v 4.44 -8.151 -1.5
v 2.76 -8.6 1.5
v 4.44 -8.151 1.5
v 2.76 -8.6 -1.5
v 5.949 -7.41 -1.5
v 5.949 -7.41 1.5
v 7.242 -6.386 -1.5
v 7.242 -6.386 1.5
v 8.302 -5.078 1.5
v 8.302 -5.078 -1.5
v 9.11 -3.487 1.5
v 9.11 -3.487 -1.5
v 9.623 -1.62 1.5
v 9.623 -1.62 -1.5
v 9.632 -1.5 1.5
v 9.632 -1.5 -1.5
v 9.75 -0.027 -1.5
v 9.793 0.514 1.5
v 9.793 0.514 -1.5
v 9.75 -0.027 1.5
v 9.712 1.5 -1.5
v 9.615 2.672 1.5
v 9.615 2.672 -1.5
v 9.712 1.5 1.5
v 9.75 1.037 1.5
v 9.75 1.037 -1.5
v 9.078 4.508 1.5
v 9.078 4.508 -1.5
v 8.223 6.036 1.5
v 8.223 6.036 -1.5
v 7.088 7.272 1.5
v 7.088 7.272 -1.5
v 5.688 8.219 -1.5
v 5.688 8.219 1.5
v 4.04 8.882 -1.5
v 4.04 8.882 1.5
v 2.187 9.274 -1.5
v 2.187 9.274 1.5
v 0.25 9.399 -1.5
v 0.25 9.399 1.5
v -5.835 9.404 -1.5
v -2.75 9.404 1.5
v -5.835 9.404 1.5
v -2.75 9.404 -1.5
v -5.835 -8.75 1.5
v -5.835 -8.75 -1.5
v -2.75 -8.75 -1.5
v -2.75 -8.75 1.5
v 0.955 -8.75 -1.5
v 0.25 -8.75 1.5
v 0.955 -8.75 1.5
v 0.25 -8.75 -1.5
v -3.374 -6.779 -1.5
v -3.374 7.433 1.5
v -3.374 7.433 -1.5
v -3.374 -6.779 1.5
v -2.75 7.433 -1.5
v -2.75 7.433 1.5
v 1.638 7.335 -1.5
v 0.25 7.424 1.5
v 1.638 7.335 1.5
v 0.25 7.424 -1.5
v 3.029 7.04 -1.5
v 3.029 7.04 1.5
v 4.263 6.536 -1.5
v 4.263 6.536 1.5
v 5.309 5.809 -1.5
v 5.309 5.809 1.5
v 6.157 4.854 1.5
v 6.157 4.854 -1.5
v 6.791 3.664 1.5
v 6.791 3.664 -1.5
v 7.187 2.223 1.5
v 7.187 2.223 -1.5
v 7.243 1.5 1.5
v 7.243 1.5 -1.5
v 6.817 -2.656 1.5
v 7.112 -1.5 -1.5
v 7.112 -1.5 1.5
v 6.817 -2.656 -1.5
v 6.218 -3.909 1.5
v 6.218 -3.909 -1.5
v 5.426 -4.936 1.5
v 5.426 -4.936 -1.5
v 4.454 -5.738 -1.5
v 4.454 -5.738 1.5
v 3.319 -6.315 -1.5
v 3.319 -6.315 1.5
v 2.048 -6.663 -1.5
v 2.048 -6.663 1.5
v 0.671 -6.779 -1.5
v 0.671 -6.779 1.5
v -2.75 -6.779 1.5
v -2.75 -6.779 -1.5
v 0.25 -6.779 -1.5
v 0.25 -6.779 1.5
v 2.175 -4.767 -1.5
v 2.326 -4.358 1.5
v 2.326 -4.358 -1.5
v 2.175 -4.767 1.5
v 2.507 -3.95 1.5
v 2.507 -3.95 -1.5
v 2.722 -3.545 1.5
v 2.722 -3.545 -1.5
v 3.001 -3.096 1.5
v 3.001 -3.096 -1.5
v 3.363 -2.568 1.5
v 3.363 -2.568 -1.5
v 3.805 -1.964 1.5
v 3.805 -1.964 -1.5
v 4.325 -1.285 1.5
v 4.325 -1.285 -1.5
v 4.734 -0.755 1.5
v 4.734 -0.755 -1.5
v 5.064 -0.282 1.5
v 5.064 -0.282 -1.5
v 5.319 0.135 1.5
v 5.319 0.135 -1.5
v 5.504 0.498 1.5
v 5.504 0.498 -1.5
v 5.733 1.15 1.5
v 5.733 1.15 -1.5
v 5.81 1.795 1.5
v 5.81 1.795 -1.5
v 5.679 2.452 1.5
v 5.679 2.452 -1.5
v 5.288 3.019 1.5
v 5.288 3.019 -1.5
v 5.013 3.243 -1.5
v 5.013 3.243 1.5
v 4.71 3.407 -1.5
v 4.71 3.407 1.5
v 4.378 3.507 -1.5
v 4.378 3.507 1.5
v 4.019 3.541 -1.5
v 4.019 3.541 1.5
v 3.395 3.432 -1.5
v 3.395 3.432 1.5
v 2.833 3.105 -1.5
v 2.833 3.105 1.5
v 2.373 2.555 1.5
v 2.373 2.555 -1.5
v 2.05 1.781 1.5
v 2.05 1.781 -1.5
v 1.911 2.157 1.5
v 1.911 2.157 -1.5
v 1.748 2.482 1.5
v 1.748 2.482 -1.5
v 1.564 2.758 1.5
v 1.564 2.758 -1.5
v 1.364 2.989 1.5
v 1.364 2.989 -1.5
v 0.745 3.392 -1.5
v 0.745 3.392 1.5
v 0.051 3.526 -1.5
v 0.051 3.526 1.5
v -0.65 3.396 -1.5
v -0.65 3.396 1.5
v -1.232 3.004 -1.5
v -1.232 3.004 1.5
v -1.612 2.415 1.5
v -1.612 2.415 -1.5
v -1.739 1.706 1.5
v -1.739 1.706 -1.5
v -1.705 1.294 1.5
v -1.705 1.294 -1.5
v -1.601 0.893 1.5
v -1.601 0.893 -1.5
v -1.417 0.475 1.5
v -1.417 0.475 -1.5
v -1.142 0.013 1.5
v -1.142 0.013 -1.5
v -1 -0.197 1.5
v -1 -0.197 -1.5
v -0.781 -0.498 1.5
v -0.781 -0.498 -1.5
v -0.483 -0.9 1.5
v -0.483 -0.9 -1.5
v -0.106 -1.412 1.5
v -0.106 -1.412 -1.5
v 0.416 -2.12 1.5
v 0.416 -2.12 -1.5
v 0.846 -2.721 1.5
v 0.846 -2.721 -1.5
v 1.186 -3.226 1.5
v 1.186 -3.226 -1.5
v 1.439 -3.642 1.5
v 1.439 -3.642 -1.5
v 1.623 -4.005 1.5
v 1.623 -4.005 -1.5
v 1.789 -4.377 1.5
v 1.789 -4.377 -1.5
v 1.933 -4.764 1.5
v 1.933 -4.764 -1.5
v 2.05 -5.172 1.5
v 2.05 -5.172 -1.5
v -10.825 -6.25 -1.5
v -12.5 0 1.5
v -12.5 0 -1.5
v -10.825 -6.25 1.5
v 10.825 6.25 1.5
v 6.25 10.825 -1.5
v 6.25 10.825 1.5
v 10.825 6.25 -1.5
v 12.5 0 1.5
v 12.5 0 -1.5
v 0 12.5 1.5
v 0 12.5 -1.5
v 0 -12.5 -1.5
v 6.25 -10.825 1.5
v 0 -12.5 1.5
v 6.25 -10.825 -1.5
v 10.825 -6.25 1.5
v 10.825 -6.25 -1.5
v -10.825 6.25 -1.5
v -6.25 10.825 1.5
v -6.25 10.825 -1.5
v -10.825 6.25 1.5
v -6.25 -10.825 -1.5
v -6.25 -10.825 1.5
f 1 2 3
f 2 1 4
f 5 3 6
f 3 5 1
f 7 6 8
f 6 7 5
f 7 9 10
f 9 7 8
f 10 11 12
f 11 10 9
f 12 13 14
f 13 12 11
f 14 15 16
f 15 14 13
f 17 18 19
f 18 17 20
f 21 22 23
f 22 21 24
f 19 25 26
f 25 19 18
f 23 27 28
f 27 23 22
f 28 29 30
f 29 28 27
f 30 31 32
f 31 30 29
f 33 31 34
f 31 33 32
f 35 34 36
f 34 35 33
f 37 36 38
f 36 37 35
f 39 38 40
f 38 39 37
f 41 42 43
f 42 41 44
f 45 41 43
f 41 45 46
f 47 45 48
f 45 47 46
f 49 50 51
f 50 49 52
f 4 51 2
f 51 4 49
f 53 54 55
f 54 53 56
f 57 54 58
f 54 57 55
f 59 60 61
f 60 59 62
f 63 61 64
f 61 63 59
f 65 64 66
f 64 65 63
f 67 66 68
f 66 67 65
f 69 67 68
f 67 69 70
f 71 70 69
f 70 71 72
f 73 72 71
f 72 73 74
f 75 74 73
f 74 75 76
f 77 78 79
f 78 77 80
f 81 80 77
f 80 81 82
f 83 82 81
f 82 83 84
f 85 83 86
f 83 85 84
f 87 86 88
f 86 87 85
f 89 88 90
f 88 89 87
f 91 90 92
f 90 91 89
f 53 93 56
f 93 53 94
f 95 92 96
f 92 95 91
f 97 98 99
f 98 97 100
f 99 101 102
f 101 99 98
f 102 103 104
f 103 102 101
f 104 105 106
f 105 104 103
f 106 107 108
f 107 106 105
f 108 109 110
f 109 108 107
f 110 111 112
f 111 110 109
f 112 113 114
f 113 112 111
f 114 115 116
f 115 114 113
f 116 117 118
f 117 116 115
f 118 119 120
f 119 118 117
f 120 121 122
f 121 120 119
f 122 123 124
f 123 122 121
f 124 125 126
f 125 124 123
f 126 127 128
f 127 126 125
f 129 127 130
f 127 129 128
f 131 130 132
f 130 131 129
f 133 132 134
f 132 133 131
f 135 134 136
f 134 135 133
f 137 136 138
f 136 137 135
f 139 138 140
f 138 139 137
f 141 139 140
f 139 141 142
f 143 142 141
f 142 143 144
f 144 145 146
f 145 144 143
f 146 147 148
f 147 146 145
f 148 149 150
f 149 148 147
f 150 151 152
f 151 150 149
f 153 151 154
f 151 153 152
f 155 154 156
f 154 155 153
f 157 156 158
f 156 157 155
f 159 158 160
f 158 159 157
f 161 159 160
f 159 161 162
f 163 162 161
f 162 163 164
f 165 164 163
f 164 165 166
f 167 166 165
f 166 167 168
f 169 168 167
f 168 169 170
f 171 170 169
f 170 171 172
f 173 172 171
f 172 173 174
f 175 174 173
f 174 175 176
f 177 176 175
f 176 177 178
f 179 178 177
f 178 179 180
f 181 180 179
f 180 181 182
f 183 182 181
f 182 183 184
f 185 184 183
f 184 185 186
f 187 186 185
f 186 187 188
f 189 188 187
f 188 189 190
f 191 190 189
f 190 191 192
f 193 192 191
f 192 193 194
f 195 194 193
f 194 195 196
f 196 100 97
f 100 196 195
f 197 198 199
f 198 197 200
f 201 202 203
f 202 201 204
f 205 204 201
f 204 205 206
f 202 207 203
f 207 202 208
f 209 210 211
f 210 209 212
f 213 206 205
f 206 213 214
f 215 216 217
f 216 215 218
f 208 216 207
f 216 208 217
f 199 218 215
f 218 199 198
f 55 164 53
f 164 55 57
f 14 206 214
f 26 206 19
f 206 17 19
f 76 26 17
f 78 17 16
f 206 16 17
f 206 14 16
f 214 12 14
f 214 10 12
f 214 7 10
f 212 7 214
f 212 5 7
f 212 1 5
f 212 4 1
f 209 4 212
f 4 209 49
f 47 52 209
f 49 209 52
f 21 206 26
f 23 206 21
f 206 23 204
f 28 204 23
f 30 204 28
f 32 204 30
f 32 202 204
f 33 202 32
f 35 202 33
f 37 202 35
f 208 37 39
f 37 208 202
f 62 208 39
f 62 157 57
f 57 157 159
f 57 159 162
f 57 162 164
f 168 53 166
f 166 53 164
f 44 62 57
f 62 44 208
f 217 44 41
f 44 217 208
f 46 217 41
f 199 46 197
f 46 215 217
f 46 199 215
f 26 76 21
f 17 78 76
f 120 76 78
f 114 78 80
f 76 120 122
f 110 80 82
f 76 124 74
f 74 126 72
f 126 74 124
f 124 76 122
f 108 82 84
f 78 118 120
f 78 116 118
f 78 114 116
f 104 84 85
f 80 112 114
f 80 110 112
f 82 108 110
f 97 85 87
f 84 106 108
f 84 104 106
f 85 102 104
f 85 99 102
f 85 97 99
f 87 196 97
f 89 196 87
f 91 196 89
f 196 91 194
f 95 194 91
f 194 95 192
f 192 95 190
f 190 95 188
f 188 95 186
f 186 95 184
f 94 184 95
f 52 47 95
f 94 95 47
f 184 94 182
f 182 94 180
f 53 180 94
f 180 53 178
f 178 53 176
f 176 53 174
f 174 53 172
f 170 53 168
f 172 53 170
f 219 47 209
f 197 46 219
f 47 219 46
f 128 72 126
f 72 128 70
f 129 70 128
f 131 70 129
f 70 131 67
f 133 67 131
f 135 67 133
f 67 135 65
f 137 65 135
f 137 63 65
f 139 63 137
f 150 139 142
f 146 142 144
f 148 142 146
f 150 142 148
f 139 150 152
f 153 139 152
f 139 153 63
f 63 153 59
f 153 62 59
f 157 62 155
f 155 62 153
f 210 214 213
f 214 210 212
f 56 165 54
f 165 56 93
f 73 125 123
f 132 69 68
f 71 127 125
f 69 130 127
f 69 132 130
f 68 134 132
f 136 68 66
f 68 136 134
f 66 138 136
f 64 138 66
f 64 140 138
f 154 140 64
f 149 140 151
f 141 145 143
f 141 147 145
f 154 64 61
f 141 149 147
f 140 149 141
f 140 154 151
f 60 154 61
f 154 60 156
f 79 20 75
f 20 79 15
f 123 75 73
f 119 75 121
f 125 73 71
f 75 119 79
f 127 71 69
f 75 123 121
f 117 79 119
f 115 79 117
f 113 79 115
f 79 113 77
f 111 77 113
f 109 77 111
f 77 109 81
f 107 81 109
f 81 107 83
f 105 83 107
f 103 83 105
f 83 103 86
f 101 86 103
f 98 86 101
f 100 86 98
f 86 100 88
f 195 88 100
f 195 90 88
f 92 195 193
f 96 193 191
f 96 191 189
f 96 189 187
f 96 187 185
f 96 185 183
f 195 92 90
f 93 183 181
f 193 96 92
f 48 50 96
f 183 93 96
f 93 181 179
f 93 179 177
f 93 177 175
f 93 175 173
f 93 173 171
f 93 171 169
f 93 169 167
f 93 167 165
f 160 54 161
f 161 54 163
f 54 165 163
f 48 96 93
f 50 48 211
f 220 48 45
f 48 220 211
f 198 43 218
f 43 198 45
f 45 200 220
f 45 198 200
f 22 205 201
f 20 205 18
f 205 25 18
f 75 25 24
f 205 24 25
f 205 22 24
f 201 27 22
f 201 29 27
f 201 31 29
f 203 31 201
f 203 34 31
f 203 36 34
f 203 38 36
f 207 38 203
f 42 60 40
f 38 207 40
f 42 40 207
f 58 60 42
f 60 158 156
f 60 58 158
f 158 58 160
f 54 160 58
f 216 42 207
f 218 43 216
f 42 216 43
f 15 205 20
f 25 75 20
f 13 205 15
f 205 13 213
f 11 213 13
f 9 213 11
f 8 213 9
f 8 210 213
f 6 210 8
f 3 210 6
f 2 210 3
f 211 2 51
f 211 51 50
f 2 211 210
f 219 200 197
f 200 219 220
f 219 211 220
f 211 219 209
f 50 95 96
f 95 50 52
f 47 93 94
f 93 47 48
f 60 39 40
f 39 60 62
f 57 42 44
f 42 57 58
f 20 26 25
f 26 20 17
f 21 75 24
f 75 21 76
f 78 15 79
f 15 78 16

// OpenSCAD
$fn=12;

// unit is mm

diameter = 25;
thickness = 3;
slit_width = 0.8;
arrow_base = 7;

diameter_2 = diameter / 2;
t2 = thickness / 2;


union() {

  difference() {

    union() {
      cylinder(d=diameter, h=thickness, center=true);
    }

    union() {

      translate([ -0.64 * diameter_2, -0.70 * diameter_2, -thickness ])
        linear_extrude(2 * thickness)
        text("D", size=19);
      translate([ -0.2 * diameter_2, -0.4 * diameter_2, -thickness ])
        linear_extrude(2 * thickness)
        text("\u2665", size=11);
    }
  }

  translate([ -0.1 * diameter_2, -0.6 * diameter_2, 0 ])
    cube([ thickness, thickness, thickness ], center=true);
  translate([ -0.1 * diameter_2, 0.65 * diameter_2, 0 ])
    cube([ thickness, thickness, thickness ], center=true);
  translate([ 0.66 * diameter_2, 0.0 * diameter_2, 0 ])
    cube([ thickness, thickness, thickness ], center=true);
}
